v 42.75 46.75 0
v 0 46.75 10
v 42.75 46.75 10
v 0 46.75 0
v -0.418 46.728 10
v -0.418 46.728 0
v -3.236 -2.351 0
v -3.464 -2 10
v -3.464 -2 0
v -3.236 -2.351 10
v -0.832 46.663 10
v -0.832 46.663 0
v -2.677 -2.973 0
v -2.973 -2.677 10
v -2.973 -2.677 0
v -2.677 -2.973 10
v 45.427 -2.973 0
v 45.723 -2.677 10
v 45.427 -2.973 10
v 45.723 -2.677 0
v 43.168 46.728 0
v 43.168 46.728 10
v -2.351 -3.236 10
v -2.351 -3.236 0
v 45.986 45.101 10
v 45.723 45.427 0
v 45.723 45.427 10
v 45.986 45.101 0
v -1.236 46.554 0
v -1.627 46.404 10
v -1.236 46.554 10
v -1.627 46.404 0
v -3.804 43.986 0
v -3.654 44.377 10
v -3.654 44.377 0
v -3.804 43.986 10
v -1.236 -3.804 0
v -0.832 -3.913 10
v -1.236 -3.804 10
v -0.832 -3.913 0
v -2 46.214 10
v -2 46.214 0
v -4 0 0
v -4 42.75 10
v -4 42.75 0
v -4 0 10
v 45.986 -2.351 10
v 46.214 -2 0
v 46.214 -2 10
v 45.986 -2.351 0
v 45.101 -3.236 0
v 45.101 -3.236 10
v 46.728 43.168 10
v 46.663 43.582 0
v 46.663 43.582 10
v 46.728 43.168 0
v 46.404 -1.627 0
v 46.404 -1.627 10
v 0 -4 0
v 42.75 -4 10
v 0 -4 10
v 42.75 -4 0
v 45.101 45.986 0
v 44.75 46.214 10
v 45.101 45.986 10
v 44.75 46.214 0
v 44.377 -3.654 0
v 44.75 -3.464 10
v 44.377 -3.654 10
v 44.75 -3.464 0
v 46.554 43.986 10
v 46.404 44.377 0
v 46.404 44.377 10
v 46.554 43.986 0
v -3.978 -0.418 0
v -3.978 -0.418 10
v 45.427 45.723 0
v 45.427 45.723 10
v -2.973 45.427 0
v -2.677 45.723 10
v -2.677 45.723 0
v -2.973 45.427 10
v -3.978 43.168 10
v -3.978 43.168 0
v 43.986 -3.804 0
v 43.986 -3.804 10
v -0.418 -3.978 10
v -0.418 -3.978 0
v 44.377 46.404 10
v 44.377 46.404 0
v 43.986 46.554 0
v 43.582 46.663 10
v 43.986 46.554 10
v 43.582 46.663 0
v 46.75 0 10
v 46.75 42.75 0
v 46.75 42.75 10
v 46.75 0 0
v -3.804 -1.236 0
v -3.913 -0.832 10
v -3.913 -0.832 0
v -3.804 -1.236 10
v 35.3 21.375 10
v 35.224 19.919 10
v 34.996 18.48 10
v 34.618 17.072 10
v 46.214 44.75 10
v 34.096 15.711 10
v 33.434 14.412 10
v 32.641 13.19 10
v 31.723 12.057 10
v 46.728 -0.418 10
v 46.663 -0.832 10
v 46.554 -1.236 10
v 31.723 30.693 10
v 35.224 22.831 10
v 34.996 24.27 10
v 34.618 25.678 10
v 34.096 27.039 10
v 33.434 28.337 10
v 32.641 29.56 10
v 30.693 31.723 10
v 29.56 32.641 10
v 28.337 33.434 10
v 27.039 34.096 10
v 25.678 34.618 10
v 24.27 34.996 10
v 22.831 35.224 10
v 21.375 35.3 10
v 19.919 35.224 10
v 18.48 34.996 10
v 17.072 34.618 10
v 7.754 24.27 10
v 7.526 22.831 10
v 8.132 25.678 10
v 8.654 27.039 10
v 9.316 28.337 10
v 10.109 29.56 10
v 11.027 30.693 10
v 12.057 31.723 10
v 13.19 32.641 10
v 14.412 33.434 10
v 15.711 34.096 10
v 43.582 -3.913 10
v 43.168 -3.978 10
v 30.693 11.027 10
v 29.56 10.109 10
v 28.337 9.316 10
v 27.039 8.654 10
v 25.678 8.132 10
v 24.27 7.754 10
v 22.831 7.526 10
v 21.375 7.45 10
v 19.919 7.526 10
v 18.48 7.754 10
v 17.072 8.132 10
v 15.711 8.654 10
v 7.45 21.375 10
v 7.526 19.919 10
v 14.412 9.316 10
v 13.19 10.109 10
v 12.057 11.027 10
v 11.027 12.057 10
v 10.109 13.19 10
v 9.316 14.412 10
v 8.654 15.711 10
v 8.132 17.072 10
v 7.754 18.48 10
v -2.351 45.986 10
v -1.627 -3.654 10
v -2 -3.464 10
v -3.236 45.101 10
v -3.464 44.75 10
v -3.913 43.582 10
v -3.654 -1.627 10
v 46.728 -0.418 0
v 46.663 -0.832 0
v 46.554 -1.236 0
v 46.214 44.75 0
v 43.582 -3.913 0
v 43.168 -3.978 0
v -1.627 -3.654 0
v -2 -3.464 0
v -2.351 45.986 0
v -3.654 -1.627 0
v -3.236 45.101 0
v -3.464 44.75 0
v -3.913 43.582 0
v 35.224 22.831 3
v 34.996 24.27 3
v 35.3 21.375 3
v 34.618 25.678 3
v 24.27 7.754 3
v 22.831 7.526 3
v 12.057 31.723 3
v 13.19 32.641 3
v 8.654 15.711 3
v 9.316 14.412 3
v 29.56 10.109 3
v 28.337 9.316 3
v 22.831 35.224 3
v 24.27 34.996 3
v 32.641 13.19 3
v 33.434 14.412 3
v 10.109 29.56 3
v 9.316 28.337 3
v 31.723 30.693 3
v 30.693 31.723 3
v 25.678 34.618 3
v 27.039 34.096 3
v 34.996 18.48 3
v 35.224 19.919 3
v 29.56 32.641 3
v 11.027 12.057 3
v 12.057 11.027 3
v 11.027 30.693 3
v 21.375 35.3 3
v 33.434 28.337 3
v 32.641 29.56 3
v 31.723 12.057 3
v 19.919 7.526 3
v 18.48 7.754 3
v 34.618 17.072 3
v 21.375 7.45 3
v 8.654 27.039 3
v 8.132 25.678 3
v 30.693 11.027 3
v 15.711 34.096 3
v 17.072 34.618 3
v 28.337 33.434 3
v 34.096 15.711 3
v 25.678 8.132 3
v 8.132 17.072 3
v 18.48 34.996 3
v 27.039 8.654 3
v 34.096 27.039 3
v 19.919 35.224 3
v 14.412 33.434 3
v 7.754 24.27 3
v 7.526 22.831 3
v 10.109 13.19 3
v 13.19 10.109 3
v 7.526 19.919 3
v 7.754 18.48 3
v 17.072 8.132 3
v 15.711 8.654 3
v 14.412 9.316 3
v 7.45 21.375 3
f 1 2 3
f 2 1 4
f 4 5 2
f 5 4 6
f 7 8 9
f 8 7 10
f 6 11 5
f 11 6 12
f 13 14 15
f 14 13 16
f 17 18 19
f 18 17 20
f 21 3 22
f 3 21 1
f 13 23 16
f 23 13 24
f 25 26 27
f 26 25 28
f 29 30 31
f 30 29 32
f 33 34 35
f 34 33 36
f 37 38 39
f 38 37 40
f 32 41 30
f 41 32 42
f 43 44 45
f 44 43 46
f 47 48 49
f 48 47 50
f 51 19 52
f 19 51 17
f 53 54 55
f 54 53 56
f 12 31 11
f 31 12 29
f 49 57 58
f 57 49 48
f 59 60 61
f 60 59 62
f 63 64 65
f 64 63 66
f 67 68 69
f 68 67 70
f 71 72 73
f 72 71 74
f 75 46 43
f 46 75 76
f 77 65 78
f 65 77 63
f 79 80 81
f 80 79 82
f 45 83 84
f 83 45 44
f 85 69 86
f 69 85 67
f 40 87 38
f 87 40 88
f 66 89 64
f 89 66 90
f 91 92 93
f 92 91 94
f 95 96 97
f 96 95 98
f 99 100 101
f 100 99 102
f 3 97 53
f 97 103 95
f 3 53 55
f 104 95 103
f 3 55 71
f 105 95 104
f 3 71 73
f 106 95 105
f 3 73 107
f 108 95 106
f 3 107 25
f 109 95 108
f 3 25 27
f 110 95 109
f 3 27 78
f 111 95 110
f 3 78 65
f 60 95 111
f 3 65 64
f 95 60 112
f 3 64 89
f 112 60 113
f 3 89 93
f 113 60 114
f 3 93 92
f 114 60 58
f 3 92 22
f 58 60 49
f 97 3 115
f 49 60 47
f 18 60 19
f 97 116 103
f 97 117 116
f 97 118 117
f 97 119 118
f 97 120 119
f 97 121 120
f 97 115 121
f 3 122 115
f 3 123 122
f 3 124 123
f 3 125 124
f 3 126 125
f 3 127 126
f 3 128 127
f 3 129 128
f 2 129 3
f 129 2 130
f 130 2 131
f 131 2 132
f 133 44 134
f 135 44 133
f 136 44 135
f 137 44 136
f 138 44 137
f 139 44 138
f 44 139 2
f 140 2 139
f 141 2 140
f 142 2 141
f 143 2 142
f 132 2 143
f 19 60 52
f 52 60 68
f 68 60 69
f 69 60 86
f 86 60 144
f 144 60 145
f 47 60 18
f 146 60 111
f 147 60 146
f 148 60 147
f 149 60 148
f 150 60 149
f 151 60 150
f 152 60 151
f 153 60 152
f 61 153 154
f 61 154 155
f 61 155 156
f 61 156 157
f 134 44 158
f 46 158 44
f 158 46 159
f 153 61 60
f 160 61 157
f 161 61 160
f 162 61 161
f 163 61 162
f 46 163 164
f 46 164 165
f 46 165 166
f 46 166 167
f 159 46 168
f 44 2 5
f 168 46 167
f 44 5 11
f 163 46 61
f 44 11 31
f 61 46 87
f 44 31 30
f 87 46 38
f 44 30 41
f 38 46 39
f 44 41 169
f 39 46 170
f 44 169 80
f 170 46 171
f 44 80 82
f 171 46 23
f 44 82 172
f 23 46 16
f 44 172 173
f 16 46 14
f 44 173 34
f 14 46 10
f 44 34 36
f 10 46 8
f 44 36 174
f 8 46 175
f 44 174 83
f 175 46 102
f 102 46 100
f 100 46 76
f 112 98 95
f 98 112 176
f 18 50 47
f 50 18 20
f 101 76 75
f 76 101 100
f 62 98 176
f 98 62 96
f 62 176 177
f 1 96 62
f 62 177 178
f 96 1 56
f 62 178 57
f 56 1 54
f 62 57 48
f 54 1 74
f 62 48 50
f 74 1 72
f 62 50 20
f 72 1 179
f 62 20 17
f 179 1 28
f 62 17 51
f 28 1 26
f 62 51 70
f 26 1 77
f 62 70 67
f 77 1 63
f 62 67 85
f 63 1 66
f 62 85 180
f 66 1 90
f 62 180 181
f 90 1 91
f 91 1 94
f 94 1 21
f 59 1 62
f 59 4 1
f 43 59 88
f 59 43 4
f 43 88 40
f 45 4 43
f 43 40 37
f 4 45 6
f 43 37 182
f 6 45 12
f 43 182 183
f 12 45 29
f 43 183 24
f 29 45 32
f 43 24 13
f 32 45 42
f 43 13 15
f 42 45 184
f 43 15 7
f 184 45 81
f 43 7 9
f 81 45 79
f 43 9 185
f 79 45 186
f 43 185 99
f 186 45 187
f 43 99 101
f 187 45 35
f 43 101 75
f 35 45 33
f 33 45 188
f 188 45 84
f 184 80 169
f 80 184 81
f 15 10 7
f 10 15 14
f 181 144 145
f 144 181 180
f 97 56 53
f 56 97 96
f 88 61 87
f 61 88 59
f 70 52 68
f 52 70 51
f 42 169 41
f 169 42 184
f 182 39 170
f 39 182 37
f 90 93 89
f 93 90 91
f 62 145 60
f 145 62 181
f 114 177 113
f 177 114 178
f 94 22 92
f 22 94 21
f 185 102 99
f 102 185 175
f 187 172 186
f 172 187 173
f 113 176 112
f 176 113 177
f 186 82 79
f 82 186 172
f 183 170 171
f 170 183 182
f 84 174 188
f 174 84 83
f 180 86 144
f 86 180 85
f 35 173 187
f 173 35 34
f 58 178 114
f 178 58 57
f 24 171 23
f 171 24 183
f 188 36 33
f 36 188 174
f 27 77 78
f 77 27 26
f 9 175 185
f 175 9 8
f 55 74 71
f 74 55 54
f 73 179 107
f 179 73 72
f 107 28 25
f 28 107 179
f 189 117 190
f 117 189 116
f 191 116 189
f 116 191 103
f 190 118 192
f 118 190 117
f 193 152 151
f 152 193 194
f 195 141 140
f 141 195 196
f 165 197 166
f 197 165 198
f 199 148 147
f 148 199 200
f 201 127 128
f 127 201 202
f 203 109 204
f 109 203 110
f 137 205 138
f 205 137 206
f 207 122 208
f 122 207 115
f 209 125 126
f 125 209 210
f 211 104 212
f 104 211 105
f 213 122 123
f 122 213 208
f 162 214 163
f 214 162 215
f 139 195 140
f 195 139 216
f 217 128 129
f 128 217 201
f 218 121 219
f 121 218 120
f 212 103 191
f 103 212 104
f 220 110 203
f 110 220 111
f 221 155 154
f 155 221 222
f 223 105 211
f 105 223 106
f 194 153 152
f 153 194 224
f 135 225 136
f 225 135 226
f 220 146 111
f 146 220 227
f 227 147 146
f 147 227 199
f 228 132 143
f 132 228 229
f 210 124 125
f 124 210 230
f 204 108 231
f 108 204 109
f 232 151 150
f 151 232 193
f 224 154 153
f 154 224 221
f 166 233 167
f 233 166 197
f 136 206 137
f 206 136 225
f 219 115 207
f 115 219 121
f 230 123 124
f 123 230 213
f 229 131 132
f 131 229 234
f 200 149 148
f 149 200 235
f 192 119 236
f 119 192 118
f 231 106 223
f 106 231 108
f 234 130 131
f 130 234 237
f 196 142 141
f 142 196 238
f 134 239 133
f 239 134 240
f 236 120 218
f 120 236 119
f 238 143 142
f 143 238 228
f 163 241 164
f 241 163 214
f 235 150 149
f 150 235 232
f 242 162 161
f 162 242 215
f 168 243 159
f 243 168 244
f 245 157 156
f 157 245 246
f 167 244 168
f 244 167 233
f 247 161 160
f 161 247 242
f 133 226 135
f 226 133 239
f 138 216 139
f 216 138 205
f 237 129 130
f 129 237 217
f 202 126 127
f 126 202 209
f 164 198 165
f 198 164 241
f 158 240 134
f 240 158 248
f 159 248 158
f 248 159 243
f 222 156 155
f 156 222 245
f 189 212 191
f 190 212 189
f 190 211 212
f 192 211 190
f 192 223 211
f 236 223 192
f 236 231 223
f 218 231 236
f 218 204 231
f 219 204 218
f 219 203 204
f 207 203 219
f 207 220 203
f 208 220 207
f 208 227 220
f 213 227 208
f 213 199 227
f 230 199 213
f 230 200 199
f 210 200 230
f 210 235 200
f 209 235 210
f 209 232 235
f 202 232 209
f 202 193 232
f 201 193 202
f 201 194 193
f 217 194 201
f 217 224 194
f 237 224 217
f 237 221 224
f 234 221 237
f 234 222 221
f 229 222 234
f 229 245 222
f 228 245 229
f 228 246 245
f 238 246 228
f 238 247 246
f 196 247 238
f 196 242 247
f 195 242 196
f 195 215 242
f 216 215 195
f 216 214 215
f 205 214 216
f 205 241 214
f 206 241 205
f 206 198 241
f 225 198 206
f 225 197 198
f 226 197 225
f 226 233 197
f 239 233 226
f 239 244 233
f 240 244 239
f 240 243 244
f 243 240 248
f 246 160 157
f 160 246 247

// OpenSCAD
// file: ../VacuumTubes/holders.scad
module tube_holder(
    rows=1,                //
    cols=1,                //
    socket_diameter=27.75, // 
    socket_tolerance=0.1,  // tolerance for socket diameter
    socket_padding=5,      // padding around socket
    socket_depth=7,        // how far down the socket should cut into the holder
    height=10,             // height of holder
    edge_padding=2.5,      // extra padding from edge of holder to last socket slot
    fillet = 4             // fillet around holder
) {
    socket_radius = (socket_diameter + socket_tolerance) / 2;
    socket_slot = socket_diameter + (socket_padding * 2);
    slot_offset = edge_padding + (socket_slot / 2);

    difference() {
        // create base
        hull() {
            base_x = (rows * socket_slot) + (2 * edge_padding);
            base_y = (cols * socket_slot) + (2 * edge_padding);

            translate([0, 0, 0]) cylinder(r=fillet, h=height);
            translate([base_x, 0, 0]) cylinder(r=fillet, h=height);
            translate([0, base_y, 0]) cylinder(r=fillet, h=height);
            translate([base_x, base_y, 0]) cylinder(r=fillet, h=height);
        }

        // socket holes
        for (i = [0:rows-1]) {
            for (j = [0:cols-1]) {
                socket_x = slot_offset + (i * socket_slot);
                socket_y = slot_offset + (j * socket_slot);

                translate([socket_x, socket_y, height-socket_depth])
                    cylinder(r=socket_radius, h=socket_depth);
            }
        }
    }
}
// main file
include <../VacuumTubes/holders.scad>

$fs = 0.1;
$fn = 60;

tube_holder(rows=1, cols=1, socket_diameter=27.75, socket_tolerance=0.1, 
    socket_padding=5, socket_depth=7, height=10, edge_padding=2.5);
